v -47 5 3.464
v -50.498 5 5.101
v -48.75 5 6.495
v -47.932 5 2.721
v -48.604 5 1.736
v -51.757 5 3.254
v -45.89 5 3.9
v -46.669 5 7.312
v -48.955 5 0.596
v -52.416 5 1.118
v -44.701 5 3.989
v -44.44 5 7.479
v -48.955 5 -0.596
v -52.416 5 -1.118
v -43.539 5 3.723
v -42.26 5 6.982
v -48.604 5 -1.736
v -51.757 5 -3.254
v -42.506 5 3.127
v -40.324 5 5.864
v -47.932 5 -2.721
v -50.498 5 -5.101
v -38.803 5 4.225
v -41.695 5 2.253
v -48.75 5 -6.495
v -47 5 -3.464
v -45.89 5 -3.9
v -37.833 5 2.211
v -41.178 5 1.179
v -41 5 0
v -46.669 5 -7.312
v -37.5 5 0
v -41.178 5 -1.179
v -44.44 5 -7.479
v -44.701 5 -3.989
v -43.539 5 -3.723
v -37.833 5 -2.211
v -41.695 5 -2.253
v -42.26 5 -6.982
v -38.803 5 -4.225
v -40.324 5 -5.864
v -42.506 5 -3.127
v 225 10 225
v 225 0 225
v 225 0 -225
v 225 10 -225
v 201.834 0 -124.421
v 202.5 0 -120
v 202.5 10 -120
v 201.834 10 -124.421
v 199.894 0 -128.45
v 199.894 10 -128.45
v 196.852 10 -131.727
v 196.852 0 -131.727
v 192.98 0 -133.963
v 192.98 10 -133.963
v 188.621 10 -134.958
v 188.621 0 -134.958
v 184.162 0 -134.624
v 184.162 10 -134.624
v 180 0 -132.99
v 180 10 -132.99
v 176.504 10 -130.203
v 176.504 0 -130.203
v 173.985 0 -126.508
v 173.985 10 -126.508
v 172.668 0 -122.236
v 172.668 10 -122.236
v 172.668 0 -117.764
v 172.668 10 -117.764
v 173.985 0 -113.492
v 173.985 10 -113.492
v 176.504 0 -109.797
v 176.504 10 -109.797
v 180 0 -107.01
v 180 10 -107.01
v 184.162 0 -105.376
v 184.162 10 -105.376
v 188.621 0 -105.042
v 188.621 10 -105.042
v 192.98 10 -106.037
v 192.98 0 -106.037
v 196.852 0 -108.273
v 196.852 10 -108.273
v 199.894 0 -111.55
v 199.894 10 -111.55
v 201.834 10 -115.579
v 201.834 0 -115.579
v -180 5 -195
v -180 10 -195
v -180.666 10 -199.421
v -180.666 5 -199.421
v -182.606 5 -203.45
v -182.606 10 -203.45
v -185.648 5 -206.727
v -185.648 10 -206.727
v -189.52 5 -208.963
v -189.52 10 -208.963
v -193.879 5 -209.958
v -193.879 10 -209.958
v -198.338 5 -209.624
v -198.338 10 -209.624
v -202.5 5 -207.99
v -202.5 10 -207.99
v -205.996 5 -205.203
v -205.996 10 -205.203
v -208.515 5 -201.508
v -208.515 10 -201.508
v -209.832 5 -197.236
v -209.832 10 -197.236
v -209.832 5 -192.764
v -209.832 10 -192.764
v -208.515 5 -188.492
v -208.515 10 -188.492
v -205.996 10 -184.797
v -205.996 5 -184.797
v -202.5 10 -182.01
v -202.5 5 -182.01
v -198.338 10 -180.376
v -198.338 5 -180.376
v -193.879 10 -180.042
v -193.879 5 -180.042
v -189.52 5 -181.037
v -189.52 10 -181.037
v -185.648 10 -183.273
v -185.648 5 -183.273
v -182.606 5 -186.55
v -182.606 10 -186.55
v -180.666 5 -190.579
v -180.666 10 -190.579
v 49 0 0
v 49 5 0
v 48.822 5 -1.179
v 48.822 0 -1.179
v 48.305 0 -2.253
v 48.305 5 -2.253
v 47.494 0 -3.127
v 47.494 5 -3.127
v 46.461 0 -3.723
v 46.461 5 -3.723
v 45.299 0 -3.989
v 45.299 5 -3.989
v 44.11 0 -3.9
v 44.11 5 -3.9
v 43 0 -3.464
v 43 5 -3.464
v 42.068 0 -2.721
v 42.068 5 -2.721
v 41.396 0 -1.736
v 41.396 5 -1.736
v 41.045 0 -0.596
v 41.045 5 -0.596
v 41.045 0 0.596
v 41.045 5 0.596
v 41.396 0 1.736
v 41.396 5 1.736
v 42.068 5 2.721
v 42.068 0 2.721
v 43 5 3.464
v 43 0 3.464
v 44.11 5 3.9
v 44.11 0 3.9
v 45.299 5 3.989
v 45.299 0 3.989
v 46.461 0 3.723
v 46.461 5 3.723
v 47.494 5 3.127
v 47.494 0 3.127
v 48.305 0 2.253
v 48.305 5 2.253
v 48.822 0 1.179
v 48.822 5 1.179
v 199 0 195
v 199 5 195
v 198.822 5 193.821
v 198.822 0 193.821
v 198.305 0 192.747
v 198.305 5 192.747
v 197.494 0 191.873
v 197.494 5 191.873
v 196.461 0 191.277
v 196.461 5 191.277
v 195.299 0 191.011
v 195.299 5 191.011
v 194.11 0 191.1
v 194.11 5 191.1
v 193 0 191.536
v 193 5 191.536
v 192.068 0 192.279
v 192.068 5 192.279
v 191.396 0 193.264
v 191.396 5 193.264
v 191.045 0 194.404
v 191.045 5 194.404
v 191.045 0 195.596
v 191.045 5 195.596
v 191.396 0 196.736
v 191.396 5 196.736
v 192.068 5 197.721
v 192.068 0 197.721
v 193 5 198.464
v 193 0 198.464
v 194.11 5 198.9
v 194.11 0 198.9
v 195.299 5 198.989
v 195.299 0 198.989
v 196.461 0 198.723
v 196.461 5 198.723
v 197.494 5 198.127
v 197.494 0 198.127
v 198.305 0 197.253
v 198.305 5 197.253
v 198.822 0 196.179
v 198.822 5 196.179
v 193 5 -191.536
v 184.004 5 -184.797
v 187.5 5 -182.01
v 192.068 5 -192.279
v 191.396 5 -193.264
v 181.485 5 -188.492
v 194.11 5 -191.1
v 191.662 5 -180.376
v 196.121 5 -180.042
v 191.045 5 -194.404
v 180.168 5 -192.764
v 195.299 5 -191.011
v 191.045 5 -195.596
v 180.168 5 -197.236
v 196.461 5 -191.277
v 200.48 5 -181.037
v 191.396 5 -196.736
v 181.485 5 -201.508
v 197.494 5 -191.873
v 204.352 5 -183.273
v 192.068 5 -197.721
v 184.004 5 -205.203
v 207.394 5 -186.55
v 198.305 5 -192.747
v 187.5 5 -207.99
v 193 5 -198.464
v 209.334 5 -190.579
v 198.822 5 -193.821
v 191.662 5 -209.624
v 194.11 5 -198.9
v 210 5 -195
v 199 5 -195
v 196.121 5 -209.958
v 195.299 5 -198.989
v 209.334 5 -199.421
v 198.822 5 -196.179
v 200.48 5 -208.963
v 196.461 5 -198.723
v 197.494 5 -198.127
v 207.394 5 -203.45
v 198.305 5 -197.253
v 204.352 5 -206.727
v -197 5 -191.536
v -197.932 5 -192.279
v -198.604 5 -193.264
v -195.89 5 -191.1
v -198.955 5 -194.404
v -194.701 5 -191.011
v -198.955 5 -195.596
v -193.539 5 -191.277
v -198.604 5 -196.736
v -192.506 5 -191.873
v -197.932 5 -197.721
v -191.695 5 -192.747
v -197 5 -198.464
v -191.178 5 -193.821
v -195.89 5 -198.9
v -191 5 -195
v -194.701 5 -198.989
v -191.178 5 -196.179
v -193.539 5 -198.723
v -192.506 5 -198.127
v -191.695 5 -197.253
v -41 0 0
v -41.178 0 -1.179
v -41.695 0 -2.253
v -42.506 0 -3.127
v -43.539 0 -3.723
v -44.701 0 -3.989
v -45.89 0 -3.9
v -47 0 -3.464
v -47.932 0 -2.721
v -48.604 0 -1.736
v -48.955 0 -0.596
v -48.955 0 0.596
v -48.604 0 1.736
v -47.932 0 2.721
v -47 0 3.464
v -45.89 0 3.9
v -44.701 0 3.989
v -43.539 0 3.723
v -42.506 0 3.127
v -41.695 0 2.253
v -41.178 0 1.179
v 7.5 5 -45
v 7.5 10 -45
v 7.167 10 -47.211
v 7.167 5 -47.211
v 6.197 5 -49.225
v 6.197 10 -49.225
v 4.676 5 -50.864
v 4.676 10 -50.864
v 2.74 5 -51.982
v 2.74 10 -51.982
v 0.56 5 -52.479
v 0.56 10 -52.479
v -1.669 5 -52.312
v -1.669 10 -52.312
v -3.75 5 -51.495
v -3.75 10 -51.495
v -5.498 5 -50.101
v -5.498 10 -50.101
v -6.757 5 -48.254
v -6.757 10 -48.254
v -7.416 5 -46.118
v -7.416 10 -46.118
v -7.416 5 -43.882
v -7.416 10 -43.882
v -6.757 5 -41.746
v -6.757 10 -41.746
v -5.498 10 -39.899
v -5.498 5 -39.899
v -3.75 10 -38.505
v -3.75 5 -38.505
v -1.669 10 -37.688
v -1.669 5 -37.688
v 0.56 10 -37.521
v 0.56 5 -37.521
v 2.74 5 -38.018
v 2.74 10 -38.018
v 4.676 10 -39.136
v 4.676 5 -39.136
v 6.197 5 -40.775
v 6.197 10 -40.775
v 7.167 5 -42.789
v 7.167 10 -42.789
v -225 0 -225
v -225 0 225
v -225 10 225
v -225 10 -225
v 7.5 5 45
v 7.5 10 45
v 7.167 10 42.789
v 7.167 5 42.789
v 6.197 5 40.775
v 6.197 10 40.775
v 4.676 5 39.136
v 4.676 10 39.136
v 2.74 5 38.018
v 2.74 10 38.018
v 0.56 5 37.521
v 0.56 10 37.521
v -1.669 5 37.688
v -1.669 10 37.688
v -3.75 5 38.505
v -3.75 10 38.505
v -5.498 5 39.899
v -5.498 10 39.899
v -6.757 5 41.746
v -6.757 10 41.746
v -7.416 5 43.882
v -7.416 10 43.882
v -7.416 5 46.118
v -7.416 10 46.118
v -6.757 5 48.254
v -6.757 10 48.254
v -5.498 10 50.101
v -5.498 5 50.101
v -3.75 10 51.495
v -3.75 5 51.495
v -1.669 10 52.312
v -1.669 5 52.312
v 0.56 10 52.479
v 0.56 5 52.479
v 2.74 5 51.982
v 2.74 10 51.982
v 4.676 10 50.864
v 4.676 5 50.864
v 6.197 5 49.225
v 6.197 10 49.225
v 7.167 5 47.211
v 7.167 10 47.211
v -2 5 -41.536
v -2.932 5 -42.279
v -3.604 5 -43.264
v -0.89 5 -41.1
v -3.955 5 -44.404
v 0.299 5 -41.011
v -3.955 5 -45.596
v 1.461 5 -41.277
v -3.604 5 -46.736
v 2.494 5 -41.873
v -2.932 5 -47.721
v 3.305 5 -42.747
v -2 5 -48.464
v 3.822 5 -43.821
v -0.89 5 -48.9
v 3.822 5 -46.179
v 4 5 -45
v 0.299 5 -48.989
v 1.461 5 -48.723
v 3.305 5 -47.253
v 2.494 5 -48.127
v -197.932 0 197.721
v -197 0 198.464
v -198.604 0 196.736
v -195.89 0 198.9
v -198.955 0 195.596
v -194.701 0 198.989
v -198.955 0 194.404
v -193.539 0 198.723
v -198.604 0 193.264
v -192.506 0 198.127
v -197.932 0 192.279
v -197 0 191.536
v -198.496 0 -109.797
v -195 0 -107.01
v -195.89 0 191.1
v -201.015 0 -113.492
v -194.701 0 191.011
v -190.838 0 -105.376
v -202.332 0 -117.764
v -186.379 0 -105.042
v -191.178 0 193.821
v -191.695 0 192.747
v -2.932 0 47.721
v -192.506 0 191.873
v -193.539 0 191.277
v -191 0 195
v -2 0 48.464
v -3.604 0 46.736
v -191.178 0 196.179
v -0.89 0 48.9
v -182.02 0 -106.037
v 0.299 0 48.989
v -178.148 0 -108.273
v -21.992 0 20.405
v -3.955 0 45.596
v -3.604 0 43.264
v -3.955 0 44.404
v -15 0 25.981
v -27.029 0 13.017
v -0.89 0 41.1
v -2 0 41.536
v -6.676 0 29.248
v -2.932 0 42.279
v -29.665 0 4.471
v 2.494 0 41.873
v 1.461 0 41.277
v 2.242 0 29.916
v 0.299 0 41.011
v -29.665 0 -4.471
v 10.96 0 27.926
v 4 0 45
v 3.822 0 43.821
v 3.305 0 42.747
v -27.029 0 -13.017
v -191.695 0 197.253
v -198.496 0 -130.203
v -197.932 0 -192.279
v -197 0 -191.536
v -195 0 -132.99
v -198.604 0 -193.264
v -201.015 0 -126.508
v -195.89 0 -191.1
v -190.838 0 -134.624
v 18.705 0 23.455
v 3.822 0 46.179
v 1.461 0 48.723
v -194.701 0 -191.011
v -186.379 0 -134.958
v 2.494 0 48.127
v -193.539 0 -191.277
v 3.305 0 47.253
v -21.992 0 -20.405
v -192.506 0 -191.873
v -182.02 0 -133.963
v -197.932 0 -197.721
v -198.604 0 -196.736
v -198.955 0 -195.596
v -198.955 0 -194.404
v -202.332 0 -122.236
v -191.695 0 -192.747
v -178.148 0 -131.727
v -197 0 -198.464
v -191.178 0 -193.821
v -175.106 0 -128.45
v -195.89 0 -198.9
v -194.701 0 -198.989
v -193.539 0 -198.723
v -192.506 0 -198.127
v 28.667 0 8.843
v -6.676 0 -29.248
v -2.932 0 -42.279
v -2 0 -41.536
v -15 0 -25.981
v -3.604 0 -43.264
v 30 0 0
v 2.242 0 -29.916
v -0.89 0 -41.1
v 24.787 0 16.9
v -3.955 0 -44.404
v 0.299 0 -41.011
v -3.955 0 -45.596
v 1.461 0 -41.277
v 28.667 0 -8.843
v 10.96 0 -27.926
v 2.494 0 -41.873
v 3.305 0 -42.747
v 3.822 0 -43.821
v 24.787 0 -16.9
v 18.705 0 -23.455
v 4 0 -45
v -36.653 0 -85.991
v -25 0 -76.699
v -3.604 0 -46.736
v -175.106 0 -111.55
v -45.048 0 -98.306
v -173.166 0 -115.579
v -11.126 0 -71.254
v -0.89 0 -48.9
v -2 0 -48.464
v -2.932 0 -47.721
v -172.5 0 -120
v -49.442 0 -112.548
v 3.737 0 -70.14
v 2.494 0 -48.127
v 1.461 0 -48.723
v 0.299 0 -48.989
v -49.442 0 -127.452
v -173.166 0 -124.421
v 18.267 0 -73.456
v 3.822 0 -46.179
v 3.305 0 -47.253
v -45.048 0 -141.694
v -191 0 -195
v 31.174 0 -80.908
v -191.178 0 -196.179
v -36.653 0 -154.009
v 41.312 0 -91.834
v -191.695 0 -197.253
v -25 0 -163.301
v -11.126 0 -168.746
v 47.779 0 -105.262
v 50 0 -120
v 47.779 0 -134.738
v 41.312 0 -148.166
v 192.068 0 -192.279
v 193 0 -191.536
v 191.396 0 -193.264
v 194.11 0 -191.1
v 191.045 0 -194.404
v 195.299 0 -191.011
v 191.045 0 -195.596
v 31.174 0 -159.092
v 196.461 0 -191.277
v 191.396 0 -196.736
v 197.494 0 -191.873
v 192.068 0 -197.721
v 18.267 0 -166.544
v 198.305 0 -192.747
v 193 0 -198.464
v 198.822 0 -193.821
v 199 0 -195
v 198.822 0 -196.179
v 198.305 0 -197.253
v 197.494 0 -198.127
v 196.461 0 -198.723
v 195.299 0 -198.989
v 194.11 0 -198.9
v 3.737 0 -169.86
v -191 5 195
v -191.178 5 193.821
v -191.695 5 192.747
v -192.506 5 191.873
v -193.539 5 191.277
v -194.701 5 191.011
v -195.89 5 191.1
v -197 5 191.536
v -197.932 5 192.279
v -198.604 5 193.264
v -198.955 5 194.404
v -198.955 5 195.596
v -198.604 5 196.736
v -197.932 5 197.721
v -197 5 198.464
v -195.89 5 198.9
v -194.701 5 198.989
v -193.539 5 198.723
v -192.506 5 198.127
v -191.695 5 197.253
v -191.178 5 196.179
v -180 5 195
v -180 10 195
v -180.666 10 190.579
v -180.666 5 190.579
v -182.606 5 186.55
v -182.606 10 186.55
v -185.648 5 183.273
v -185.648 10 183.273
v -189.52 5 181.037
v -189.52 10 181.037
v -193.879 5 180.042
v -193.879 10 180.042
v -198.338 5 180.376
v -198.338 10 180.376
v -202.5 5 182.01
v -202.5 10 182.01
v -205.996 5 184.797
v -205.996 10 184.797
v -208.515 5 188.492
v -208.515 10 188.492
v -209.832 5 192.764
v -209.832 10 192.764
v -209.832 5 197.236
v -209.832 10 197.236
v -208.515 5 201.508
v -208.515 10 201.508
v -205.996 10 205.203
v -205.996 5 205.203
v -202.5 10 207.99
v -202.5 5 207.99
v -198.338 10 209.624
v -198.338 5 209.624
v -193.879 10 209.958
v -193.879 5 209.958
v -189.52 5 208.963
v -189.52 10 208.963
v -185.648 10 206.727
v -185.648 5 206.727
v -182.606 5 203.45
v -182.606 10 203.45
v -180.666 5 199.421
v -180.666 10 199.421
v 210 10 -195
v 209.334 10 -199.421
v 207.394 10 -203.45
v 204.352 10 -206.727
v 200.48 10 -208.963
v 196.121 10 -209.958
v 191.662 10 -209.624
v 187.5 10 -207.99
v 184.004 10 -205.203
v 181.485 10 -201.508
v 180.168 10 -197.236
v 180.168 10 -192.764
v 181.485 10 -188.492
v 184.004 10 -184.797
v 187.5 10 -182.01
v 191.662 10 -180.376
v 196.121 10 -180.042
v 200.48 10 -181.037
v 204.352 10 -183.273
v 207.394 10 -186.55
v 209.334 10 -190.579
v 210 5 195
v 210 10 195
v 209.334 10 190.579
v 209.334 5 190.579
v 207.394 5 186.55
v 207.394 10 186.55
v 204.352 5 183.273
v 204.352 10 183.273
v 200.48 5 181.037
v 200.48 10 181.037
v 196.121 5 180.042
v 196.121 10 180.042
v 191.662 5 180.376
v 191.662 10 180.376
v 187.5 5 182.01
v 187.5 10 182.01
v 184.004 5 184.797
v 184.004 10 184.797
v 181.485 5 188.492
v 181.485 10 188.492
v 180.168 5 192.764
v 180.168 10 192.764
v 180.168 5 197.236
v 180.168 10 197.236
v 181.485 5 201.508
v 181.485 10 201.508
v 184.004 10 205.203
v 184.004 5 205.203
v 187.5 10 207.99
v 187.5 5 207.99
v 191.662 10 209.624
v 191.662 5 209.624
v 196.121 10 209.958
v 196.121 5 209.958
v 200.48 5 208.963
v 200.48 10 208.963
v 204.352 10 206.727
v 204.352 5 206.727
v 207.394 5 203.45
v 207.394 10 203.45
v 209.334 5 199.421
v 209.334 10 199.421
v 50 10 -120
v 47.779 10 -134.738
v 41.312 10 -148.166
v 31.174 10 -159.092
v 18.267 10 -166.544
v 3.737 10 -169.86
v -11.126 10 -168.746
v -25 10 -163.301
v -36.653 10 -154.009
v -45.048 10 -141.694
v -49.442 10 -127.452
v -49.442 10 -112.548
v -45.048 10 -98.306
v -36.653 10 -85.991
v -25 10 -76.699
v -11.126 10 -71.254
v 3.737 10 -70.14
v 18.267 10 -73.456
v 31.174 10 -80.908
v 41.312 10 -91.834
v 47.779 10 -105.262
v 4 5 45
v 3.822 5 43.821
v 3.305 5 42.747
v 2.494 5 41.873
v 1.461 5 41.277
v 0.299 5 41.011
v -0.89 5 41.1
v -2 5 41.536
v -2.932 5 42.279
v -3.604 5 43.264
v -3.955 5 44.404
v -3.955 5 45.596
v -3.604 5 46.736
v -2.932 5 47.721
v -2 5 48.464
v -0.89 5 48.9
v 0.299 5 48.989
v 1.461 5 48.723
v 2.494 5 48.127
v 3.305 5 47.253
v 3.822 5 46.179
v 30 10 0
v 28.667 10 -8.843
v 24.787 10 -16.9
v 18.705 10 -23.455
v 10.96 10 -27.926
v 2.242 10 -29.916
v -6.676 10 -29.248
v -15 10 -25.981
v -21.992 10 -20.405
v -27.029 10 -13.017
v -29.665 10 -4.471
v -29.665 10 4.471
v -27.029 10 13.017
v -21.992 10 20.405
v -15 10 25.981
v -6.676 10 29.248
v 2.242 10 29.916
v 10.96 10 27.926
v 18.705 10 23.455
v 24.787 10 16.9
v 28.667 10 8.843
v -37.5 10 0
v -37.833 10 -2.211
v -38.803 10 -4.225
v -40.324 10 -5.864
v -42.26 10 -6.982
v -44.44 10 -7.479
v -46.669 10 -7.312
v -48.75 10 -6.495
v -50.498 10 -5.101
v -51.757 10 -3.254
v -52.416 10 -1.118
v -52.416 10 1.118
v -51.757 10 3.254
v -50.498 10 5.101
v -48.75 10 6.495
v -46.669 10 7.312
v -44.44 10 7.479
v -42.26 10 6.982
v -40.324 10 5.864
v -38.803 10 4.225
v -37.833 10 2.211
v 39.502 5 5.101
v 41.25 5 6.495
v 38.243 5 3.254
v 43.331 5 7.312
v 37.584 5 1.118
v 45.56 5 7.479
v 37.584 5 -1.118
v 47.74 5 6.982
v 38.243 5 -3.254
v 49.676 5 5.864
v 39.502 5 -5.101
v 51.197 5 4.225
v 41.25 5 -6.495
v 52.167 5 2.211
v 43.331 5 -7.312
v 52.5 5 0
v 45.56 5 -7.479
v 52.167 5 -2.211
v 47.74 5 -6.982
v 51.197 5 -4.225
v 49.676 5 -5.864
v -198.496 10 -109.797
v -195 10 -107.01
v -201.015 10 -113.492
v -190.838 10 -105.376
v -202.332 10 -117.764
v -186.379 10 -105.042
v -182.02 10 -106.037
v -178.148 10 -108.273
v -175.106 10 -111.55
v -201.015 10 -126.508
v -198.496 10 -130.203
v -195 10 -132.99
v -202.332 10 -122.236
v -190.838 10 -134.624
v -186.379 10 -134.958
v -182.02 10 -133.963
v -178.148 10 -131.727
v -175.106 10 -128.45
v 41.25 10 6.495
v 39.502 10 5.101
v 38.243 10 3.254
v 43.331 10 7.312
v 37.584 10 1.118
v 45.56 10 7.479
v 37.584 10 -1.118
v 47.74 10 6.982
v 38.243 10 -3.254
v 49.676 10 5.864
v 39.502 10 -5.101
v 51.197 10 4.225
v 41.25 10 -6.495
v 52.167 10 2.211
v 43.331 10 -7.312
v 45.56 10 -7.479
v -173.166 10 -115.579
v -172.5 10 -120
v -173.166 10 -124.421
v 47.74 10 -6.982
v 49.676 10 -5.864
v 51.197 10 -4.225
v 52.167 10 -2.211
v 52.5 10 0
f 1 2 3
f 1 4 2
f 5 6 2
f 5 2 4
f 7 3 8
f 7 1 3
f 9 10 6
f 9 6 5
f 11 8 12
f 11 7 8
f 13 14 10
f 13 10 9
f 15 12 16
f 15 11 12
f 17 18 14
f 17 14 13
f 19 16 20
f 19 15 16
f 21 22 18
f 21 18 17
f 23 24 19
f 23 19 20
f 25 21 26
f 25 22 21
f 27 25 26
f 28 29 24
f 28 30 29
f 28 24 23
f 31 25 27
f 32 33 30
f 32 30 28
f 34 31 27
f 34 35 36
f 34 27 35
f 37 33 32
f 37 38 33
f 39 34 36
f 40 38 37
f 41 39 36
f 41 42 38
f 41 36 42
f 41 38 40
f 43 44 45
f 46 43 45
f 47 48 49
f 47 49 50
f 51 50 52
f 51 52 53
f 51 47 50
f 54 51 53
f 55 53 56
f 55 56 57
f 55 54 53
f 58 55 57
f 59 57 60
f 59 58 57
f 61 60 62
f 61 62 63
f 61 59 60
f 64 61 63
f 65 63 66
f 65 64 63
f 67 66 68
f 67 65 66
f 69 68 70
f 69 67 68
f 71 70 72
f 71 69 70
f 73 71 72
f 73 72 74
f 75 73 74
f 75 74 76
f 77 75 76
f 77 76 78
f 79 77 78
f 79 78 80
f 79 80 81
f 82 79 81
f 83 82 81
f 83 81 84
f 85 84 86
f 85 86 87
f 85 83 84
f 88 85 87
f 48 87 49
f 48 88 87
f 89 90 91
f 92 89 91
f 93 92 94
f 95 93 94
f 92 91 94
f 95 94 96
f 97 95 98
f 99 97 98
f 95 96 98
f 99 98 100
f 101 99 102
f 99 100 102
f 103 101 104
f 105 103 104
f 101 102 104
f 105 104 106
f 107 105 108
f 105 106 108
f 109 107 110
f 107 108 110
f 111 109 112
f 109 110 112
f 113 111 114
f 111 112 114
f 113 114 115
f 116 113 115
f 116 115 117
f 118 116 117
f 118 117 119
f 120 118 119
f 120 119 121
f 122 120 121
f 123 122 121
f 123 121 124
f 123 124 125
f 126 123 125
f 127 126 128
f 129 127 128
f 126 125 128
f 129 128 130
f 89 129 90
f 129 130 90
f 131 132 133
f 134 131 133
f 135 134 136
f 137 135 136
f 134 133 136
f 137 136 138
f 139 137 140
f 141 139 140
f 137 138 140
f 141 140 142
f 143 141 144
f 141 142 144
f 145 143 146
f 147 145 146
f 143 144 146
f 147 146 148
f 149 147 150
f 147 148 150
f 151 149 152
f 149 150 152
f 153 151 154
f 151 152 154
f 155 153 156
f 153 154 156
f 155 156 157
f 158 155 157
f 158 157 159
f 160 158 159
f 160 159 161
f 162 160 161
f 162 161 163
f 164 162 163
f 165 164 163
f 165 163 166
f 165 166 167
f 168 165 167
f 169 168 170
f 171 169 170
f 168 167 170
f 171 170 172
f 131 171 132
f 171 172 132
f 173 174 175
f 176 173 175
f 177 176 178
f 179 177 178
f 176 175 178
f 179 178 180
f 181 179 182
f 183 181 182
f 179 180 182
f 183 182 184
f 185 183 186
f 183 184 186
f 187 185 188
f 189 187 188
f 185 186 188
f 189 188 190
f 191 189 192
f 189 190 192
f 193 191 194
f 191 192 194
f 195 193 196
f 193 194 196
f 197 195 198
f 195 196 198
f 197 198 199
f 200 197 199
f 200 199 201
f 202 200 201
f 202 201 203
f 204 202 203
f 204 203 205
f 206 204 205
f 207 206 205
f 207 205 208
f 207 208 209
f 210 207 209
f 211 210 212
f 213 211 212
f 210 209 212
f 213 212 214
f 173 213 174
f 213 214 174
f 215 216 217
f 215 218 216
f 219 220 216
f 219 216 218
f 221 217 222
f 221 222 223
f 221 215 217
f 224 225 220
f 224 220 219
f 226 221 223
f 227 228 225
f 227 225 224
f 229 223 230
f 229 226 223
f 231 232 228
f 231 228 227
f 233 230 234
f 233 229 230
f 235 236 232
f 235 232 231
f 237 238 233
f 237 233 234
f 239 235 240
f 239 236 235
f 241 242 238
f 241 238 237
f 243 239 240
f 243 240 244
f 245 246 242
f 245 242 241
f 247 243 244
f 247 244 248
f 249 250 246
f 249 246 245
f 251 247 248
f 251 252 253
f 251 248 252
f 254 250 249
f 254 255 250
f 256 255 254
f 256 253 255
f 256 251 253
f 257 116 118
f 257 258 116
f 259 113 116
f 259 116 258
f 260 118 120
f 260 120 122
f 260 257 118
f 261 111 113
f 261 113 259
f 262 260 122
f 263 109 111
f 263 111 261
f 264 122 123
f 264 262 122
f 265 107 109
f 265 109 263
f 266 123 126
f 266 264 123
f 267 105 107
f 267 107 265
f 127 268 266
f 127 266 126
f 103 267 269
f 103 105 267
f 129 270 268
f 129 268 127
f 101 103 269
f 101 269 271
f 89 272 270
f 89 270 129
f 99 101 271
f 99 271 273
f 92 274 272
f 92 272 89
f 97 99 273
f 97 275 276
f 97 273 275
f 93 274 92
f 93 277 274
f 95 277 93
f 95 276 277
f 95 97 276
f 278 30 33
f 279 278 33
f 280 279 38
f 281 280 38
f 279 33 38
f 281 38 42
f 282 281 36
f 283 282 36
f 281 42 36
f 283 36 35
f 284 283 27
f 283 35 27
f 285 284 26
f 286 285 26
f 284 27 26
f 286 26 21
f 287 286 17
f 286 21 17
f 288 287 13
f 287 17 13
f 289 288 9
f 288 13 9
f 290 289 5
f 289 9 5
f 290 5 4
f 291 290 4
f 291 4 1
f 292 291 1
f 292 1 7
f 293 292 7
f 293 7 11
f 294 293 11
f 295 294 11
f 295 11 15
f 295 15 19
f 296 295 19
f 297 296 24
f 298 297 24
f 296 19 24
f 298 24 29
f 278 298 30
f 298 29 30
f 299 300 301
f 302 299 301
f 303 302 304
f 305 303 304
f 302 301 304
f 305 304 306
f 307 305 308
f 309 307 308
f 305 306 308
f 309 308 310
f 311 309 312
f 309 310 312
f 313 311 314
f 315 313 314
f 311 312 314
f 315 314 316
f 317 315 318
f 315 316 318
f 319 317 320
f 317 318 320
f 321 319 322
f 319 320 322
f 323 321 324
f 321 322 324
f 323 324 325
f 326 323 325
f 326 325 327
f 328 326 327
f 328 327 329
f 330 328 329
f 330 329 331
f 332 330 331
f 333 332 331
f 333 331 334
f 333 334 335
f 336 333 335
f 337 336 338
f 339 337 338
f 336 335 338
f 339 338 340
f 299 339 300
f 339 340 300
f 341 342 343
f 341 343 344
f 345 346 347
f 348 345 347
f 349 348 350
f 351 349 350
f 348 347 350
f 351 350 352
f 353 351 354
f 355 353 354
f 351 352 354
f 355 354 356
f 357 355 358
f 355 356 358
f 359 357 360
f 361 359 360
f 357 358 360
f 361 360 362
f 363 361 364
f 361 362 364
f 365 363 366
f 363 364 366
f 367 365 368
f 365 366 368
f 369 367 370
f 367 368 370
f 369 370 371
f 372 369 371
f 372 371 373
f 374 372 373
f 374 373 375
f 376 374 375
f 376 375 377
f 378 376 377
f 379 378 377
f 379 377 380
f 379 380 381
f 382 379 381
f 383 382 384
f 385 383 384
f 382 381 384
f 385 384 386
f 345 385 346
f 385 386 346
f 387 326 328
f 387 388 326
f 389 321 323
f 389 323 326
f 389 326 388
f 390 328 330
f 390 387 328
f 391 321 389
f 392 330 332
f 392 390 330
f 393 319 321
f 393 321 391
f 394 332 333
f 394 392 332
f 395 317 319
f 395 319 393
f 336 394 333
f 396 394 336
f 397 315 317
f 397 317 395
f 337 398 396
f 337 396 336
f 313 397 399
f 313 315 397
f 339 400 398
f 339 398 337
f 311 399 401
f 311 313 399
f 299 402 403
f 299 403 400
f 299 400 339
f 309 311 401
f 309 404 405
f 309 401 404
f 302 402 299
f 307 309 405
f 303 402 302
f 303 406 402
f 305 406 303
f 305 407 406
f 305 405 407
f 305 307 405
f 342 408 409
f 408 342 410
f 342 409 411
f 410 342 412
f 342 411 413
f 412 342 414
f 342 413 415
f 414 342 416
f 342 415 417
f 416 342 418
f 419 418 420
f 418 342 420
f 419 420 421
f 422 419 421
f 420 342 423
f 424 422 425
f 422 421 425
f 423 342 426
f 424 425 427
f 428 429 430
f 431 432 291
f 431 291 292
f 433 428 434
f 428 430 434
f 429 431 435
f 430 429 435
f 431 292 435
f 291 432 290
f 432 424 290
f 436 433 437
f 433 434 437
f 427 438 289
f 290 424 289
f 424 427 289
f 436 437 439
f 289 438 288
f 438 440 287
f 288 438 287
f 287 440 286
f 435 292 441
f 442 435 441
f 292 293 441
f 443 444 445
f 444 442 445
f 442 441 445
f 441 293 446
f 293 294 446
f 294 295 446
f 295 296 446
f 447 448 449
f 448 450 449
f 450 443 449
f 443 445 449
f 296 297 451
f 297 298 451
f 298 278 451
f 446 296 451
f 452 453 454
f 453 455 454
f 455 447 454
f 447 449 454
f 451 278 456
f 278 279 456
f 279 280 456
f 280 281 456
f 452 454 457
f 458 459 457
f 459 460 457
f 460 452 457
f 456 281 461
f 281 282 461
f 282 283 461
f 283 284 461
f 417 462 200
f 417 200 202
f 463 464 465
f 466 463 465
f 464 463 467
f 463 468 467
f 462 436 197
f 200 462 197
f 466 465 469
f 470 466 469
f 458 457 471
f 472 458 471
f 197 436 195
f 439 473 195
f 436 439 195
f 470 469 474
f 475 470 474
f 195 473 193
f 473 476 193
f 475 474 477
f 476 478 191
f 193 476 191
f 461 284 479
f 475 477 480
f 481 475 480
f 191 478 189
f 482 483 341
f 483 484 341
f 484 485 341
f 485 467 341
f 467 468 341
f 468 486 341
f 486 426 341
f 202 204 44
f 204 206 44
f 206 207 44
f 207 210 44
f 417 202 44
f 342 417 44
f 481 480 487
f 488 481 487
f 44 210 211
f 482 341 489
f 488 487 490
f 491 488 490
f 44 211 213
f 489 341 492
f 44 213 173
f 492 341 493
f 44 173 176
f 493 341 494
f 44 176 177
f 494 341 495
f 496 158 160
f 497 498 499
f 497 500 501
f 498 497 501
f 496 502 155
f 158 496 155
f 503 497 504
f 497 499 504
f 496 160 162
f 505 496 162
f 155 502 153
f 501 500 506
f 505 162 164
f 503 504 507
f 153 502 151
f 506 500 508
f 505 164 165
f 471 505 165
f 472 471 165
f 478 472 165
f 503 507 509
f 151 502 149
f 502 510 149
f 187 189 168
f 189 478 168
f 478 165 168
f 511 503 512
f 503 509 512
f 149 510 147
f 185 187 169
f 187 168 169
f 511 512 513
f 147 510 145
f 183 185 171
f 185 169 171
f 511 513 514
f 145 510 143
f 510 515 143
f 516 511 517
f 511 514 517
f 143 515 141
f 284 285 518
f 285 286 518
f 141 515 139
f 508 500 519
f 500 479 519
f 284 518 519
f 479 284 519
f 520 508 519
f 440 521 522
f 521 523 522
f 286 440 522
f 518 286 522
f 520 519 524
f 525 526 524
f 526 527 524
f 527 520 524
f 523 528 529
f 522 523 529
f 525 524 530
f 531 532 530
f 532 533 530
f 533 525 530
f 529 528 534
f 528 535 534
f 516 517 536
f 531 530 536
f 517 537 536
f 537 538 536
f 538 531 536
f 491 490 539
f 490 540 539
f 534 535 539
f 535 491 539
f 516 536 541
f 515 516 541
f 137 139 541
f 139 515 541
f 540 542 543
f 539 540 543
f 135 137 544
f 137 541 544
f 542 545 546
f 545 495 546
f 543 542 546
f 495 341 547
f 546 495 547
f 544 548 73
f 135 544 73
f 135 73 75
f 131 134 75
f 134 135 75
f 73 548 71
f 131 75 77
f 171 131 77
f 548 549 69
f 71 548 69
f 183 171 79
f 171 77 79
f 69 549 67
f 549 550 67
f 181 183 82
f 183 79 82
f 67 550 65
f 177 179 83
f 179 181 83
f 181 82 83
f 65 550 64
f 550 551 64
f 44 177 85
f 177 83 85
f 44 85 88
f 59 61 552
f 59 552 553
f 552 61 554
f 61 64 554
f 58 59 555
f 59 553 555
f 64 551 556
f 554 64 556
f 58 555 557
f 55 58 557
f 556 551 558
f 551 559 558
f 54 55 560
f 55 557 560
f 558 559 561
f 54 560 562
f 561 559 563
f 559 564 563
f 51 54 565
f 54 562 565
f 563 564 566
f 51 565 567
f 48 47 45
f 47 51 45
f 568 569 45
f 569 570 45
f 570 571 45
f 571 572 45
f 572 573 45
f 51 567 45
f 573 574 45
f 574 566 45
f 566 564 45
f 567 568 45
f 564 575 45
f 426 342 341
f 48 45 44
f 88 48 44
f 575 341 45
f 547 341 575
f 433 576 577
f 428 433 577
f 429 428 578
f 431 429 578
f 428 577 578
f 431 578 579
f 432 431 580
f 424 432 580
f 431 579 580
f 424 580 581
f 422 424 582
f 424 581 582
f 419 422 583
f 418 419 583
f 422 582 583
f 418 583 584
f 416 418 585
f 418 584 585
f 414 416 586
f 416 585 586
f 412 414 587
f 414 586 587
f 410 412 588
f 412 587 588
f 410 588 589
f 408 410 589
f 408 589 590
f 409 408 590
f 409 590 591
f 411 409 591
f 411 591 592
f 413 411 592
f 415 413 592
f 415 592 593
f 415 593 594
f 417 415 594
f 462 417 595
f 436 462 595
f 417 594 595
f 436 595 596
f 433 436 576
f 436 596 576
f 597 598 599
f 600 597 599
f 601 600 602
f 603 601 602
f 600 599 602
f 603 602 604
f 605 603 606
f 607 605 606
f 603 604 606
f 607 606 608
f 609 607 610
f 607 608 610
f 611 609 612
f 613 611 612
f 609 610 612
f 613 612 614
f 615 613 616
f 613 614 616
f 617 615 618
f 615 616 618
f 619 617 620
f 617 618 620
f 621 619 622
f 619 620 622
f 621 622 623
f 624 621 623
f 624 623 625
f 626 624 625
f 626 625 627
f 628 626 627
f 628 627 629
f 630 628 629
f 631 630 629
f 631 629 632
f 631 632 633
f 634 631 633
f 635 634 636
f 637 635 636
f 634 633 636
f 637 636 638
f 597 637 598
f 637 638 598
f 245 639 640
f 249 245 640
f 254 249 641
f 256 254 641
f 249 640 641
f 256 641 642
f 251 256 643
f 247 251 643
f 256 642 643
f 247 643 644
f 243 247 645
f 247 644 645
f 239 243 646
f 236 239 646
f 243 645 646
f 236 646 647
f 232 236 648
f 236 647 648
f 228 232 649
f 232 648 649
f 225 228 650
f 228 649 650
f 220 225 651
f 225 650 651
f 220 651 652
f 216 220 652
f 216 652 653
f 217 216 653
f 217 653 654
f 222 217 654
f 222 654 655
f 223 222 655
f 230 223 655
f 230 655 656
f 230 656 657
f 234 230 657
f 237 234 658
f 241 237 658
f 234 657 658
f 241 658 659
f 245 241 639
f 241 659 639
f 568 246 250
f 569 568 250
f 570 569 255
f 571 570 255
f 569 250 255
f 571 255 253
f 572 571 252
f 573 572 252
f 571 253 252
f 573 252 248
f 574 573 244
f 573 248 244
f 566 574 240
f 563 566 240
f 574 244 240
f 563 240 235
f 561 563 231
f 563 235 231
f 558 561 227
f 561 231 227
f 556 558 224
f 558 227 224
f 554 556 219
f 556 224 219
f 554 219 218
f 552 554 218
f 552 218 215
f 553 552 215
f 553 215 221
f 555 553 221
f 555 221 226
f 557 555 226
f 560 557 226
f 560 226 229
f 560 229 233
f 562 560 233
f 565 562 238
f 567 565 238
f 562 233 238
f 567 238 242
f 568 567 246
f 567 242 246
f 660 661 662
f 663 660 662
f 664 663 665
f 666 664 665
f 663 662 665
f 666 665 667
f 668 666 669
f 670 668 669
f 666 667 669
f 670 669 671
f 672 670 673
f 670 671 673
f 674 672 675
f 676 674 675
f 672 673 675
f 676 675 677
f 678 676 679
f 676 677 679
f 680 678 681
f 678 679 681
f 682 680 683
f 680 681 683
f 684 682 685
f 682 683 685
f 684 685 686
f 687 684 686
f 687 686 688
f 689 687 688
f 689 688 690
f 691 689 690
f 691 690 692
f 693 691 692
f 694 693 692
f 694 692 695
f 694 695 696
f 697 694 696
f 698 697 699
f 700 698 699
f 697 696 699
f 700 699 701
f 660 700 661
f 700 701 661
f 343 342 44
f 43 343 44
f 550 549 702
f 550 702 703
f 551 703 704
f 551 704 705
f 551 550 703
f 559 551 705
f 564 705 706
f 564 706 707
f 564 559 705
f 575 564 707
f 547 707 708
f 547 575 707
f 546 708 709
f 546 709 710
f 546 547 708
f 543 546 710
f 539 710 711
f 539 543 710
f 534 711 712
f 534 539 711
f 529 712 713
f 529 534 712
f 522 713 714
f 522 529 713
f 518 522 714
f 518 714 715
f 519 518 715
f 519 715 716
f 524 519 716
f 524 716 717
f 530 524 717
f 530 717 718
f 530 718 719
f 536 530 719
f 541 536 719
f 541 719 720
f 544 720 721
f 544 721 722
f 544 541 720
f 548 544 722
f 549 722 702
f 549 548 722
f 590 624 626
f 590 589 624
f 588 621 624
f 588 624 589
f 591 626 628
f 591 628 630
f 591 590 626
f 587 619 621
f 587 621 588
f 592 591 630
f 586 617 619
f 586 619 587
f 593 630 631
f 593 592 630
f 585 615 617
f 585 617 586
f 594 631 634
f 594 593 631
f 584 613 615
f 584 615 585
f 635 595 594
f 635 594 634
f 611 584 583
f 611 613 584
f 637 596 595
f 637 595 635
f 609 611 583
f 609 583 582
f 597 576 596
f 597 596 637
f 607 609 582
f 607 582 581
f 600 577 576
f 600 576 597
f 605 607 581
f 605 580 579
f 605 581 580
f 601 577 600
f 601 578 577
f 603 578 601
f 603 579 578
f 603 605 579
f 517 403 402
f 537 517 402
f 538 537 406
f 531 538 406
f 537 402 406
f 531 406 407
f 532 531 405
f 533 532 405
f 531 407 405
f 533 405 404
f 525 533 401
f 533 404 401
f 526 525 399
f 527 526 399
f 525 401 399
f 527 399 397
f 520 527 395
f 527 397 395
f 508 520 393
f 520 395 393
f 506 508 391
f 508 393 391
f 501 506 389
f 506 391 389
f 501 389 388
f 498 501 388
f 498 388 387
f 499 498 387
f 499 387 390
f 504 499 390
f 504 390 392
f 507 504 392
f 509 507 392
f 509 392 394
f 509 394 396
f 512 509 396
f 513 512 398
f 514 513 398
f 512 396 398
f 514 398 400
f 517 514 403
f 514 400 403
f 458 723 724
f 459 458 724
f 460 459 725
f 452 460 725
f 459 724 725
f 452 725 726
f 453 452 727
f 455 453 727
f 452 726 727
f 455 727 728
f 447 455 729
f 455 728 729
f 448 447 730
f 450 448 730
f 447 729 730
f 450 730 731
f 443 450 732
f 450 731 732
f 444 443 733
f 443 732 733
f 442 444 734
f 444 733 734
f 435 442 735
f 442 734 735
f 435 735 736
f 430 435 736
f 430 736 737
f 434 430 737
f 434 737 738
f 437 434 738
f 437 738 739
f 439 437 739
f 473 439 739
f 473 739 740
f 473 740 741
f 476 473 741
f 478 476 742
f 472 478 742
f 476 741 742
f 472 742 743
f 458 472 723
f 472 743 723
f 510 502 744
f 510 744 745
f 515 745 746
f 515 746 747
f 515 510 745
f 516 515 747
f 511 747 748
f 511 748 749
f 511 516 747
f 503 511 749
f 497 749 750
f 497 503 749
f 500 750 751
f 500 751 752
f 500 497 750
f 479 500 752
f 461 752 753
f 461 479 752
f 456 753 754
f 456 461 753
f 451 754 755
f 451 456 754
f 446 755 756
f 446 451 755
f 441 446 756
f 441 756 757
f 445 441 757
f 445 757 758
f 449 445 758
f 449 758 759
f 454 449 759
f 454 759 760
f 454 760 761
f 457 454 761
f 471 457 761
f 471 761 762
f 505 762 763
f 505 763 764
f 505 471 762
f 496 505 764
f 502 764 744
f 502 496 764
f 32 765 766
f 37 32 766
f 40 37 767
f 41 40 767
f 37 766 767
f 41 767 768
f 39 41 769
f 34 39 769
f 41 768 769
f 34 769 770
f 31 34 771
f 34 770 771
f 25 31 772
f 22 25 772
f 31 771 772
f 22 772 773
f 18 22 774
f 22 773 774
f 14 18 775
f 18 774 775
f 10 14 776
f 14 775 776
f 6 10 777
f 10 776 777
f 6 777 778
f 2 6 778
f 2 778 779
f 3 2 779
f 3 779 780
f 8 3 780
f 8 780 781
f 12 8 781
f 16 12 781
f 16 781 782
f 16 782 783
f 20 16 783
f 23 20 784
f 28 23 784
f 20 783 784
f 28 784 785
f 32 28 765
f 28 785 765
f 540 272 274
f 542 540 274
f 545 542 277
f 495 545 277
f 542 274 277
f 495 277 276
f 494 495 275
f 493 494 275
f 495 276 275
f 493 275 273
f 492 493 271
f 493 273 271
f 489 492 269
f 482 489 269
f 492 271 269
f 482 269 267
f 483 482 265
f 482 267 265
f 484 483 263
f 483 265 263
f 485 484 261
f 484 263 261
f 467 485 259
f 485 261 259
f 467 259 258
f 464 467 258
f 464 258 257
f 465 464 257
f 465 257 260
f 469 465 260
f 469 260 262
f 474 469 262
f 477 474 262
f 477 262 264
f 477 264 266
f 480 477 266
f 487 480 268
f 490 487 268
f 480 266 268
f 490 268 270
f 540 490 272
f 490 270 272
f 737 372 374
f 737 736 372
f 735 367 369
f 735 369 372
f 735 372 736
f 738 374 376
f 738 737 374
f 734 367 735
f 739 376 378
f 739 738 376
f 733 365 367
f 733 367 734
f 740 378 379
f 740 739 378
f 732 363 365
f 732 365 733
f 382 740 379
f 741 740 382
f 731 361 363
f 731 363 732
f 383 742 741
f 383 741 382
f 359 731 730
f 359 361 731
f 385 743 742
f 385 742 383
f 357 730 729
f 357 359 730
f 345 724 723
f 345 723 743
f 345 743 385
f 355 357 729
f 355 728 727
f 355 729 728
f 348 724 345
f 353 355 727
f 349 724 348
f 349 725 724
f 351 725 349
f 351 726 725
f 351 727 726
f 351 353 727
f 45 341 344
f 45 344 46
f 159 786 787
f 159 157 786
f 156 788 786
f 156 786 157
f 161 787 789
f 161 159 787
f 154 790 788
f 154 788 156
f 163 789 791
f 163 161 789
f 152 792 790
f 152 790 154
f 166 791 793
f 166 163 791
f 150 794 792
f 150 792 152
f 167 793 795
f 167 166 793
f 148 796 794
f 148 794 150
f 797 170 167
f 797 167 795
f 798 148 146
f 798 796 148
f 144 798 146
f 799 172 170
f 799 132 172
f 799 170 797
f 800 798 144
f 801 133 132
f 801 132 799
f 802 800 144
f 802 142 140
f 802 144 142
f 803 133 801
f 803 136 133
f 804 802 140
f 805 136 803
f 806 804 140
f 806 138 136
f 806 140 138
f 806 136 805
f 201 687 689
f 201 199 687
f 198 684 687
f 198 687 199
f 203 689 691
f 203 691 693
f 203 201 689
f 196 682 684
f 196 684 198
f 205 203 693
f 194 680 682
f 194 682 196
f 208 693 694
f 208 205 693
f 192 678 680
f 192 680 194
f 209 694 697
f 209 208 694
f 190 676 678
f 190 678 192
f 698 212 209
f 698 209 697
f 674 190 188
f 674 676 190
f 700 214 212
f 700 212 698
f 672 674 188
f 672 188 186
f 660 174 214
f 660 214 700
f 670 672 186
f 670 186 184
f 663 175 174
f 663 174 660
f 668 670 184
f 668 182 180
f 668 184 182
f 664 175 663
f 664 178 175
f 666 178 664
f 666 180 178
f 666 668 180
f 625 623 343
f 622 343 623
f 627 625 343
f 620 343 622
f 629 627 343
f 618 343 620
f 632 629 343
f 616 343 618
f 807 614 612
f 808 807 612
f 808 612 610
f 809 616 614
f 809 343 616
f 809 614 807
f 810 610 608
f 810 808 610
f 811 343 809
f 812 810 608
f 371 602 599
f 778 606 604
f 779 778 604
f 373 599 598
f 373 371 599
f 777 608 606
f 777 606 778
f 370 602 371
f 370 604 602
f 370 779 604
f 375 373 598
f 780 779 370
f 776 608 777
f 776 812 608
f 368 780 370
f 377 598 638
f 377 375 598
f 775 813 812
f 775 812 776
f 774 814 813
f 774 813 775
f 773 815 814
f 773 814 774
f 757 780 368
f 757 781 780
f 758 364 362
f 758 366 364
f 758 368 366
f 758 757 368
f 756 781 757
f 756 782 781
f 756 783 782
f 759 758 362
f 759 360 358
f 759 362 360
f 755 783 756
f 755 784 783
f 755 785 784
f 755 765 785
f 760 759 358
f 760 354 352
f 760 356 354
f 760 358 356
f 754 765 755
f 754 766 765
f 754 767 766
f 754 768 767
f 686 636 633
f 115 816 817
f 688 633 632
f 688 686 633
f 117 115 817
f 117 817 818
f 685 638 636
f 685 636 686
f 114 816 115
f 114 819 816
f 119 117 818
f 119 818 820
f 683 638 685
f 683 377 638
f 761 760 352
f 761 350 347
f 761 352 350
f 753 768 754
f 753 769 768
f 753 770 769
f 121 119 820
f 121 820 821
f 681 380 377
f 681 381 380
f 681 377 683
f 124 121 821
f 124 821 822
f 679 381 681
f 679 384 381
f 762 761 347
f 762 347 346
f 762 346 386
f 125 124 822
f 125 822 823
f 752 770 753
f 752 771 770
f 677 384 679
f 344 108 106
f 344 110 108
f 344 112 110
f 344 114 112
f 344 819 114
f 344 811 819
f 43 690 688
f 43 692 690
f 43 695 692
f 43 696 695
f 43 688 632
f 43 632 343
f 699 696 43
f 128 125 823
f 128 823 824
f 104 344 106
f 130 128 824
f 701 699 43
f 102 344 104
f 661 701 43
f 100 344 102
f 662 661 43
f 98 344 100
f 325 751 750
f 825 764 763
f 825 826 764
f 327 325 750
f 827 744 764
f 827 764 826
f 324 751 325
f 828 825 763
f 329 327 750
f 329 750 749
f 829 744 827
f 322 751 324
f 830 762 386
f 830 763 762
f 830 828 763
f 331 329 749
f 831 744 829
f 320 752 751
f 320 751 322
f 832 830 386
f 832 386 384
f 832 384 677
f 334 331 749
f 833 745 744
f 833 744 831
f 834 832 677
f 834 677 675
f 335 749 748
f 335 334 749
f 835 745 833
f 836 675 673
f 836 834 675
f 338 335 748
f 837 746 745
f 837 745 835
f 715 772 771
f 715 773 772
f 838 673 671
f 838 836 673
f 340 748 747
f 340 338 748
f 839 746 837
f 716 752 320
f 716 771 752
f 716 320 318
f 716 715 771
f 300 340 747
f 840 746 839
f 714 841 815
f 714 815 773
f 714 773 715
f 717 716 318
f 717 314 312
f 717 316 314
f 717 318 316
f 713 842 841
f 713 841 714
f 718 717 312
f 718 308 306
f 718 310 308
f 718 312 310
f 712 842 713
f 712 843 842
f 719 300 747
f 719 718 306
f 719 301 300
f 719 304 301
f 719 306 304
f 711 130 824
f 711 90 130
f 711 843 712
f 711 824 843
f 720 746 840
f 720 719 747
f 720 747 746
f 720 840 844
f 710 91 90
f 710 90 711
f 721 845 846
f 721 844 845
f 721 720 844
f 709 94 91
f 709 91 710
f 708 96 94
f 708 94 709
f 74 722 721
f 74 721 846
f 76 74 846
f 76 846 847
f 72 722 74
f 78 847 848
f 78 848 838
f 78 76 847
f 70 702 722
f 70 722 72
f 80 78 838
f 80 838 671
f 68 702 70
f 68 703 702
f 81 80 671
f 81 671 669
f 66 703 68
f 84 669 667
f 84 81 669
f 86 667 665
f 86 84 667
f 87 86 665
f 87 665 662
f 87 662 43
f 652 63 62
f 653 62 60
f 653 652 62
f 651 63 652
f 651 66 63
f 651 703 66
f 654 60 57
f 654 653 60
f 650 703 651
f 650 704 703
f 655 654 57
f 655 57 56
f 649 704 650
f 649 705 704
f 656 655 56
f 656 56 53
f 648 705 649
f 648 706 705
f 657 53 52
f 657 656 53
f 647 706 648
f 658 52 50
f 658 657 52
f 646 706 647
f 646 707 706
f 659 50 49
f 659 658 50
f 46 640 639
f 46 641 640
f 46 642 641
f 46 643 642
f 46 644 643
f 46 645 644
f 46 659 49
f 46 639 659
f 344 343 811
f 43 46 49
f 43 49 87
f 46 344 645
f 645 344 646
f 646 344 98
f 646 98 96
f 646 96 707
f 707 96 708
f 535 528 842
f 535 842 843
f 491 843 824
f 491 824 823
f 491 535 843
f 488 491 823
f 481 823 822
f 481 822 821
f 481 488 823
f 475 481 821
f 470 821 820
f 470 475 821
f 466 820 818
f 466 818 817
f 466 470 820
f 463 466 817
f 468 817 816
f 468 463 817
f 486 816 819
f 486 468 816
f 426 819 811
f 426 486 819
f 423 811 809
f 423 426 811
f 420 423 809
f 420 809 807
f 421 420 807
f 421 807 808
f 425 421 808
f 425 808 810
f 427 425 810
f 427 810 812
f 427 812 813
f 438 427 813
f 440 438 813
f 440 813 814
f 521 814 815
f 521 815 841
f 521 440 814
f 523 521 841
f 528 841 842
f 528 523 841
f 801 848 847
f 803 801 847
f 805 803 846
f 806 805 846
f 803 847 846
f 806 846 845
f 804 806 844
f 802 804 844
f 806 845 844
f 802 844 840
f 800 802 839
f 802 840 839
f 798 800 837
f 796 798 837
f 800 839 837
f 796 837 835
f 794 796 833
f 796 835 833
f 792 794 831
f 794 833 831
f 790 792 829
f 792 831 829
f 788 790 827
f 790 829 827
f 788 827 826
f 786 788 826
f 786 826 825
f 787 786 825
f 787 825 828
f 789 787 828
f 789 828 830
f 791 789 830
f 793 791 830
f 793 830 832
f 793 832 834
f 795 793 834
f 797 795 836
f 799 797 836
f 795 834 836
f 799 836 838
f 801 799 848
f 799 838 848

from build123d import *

# Parameters (mm, degrees)
CROQUIS1_W              = 450
CROQUIS1_H              = 450
CROQUIS1_R              = 30
CROQUIS1_R_2            = 50
CROQUIS1_R_3            = 15
SALIENTE_EXTRUIR1_DEPTH = 10
CROQUIS7_R              = 15
CROQUIS7_R_2            = 7.5
CORTAR_EXTRUIR6_DEPTH   = 5
CROQUIS8_R              = 4
CORTAR_EXTRUIR7_DEPTH   = 5


with BuildPart() as part:
    # Croquis1 → Saliente-Extruir1 (new body)
    with BuildSketch(Plane(origin=(0, 0, 0), x_dir=(1, 0, 0), z_dir=(0, 1, 0))):
        Rectangle(CROQUIS1_W, CROQUIS1_H)
        Circle(CROQUIS1_R, mode=Mode.SUBTRACT)
        with Locations((0, 120)):
            Circle(CROQUIS1_R_2, mode=Mode.SUBTRACT)
        with Locations((-187.5, 120)):
            Circle(CROQUIS1_R_3, mode=Mode.SUBTRACT)
        with Locations((187.5, 120)):
            Circle(CROQUIS1_R_3, mode=Mode.SUBTRACT)
    extrude(amount=SALIENTE_EXTRUIR1_DEPTH)

    # Croquis7 → Cortar-Extruir6 (cut)
    with BuildSketch(Plane(origin=(0, 10, 0), x_dir=(1, 0, 0), z_dir=(0, 1, 0))):
        with Locations((-195, 195)):
            Circle(CROQUIS7_R)
        with Locations((195, 195)):
            Circle(CROQUIS7_R)
        with Locations((195, -195)):
            Circle(CROQUIS7_R)
        with Locations((-195, -195)):
            Circle(CROQUIS7_R)
        with Locations((-45, 0)):
            Circle(CROQUIS7_R_2)
        with Locations((0, 45)):
            Circle(CROQUIS7_R_2)
        with Locations((0, -45)):
            Circle(CROQUIS7_R_2)
        with Locations((45, 0)):
            Circle(CROQUIS7_R_2)
    extrude(amount=-CORTAR_EXTRUIR6_DEPTH, mode=Mode.SUBTRACT)

    # Croquis8 → Cortar-Extruir7 (cut)
    with BuildSketch(Plane(origin=(0, 5, 0), x_dir=(1, 0, 0), z_dir=(0, 1, 0))):
        with Locations((195, -195)):
            Circle(CROQUIS8_R)
        with Locations((-195, -195)):
            Circle(CROQUIS8_R)
        with Locations((-45, 0)):
            Circle(CROQUIS8_R)
        with Locations((45, 0)):
            Circle(CROQUIS8_R)
        with Locations((0, -45)):
            Circle(CROQUIS8_R)
        with Locations((0, 45)):
            Circle(CROQUIS8_R)
        with Locations((195, 195)):
            Circle(CROQUIS8_R)
        with Locations((-195, 195)):
            Circle(CROQUIS8_R)
    extrude(amount=-CORTAR_EXTRUIR7_DEPTH, mode=Mode.SUBTRACT)


solid = part.part
